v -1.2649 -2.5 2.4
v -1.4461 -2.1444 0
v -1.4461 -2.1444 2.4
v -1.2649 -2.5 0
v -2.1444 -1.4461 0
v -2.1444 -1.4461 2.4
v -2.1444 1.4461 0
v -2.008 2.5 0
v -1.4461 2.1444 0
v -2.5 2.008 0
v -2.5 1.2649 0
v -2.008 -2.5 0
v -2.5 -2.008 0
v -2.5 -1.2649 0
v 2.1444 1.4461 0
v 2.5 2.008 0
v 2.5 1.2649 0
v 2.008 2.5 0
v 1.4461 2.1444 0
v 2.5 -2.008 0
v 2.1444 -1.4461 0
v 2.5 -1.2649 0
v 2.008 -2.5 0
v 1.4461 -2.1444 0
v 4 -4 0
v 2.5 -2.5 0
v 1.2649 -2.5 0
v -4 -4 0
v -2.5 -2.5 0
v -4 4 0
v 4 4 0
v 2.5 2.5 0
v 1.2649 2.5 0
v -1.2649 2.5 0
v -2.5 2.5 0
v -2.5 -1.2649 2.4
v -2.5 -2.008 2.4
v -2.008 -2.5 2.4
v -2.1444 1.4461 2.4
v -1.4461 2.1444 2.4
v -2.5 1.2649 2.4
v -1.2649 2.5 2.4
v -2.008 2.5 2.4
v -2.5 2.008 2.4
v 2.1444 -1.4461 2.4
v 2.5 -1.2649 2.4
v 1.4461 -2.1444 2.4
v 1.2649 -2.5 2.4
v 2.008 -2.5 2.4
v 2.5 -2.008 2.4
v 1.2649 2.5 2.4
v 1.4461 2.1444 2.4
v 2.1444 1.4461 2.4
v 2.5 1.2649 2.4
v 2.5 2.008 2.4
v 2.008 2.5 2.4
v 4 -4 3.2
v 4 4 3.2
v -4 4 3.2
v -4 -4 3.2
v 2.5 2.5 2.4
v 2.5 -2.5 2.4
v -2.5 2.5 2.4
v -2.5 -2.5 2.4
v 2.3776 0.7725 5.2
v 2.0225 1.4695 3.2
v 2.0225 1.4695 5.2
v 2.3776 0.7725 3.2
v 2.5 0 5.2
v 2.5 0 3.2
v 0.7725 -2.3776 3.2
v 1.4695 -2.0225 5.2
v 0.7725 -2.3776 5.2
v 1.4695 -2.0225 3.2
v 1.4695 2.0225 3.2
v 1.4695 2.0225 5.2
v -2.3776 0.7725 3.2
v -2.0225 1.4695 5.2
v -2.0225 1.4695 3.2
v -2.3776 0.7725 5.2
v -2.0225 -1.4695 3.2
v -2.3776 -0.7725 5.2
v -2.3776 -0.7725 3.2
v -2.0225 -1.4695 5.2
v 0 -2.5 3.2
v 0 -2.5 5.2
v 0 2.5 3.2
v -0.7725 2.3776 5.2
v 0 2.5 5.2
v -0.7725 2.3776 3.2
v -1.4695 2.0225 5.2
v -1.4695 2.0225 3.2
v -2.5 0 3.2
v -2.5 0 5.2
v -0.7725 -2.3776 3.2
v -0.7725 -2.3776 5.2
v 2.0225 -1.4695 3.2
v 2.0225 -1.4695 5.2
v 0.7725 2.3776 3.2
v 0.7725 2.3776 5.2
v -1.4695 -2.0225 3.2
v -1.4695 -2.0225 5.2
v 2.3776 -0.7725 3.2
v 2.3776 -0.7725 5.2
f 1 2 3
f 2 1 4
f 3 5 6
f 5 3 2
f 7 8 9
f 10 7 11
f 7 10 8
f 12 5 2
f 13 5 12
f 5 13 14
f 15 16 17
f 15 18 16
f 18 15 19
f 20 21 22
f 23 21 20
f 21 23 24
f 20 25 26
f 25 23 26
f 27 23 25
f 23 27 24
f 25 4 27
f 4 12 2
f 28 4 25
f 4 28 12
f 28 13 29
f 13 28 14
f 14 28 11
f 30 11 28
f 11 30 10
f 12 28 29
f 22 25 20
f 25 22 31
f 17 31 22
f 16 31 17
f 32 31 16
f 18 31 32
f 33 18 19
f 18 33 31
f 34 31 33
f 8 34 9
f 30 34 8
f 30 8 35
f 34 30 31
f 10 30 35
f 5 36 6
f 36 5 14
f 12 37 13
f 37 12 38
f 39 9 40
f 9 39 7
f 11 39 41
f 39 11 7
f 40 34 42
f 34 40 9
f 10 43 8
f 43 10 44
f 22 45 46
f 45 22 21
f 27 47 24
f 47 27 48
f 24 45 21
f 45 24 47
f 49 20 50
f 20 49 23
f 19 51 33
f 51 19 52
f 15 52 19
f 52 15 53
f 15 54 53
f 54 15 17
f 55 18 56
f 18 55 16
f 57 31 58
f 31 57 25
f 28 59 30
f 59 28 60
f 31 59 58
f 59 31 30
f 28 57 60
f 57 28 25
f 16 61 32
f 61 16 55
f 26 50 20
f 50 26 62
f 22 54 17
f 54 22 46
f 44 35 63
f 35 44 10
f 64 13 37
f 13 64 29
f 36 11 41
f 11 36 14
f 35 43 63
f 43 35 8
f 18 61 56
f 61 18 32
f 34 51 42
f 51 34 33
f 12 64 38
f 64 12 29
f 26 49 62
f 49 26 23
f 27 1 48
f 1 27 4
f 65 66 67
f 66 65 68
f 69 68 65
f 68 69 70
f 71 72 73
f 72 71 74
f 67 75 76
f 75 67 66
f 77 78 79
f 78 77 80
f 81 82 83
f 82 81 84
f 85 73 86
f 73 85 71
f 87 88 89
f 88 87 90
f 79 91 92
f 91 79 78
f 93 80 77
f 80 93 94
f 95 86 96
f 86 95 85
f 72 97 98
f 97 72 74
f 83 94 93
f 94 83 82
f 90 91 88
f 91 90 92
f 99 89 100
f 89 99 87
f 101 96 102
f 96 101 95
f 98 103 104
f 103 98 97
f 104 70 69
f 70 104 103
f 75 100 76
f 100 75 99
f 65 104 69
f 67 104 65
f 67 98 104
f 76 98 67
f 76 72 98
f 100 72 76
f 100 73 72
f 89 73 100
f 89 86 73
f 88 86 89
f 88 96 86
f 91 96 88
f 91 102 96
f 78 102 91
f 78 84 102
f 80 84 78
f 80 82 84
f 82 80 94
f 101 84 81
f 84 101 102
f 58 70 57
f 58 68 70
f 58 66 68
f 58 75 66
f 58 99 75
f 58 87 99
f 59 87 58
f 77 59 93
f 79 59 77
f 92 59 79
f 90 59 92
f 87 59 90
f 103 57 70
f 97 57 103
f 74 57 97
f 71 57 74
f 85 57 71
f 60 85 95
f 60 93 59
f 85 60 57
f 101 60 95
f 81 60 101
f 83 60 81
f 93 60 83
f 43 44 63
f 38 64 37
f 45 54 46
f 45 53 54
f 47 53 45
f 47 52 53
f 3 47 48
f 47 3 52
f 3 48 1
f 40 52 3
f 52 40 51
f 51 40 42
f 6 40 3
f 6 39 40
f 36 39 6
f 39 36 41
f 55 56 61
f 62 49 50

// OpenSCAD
// file: bricks.scad
// Copyright 2013 Jonathan Hulka
// This program is free software; you can redistribute it and/or modify
// it under the terms of the GNU General Public License as published by
// the Free Software Foundation; either version 2 of the License, or
// (at your option) any later version.
// 
// This program is distributed in the hope that it will be useful,
// but WITHOUT ANY WARRANTY; without even the implied warranty of
// MERCHANTABILITY or FITNESS FOR A PARTICULAR PURPOSE.  See the
// GNU General Public License for more details.
// 
// You should have received a copy of the GNU General Public License
// along with this program; if not, write to the Free Software
// Foundation, Inc., 51 Franklin Street, Fifth Floor, Boston,
// MA 02110-1301, USA.


peg_space=8;
peg_radius=2.5;
peg_height=2;
peg_allowance=0.4; //Extra space for pegs in bottom of a brick of height 1
brick_height=3.2; //This is the flat brick
peg_diagonal_space=peg_space*sqrt(2);
//rod_radius=2;
$fn=20;
//left edge: x=0;
//top edge: y=0;
//peg bottom: z=0;
//The platform sits below the z axis
module brick_top(pegs_x,pegs_y)
{
//	difference()
//	{
		union()
		{
			//Pegs extend 0.2mm down into the platform to ensure connection
			for(i=[0:pegs_x-1], j=[0:pegs_y-1])
				translate([(0.5 + i)*peg_space, (0.5 + j)*peg_space,peg_height/2-0.1])
					cylinder(h=peg_height+0.2,r=peg_radius,center=true);
			//The platform sits just under the z-axis
			translate([pegs_x*peg_space/2,pegs_y*peg_space/2,-(brick_height-peg_height-peg_allowance)/2])
				cube(size=[pegs_x*peg_space,pegs_y*peg_space,brick_height-peg_height-peg_allowance],center=true);
		}
//		for(i=[0:pegs_x-1], j=[0:pegs_y-1])
//			translate([(0.5 + i)*peg_space, (0.5 + j)*peg_space,0])
//				cylinder(h=10,r=rod_radius,center=true);
//	}
}

module brick_bottom_cylinders(pegs_x,pegs_y,height,filled=false)
{
	intersection()
	{
		for(i=[0:pegs_x], j=[0:pegs_y])
		{
			translate([i*peg_space,j*peg_space,height/2])
			
			if(filled)
			{
				cylinder(h=height,r=(peg_diagonal_space-peg_radius*2)/2,center=true);
			}
			else
			{
				difference()
				{
					cylinder(h=height,r=(peg_diagonal_space-peg_radius*2)/2,center=true);
					cylinder(h=height+1,r=peg_radius,center=true);
				}
			}
		}
		translate([pegs_x/2*peg_space,pegs_y/2*peg_space,height/2])
		cube(size=[pegs_x*peg_space,pegs_y*peg_space,height+1],center=true);
	}	
}

module brick_bottom_edges(pegs_x,pegs_y,height)
{
	translate([peg_space*pegs_x/2,peg_space*pegs_y/2,height/2]) difference()
	{
		cube(size=[peg_space*pegs_x,peg_space*pegs_y,height],center=true);
		cube(size=[peg_space*(pegs_x-1)+peg_radius*2,peg_space*(pegs_y-1)+peg_radius*2,height+1],center=true);
	}
}

module simple_brick(pegs_x,pegs_y,bricks_z)
{
	union()
	{
		translate([-peg_space*pegs_x/2,-peg_space*pegs_y/2,0])
		{
			brick_bottom_cylinders(pegs_x,pegs_y,brick_height*bricks_z);
			brick_bottom_edges(pegs_x,pegs_y,brick_height*bricks_z);
		}
		translate([-peg_space*pegs_x/2,-peg_space*pegs_y/2,brick_height*bricks_z]) brick_top(pegs_x,pegs_y);
	}
}
// main file
// Copyright 2013 Jonathan Hulka
// This program is free software; you can redistribute it and/or modify
// it under the terms of the GNU General Public License as published by
// the Free Software Foundation; either version 2 of the License, or
// (at your option) any later version.
// 
// This program is distributed in the hope that it will be useful,
// but WITHOUT ANY WARRANTY; without even the implied warranty of
// MERCHANTABILITY or FITNESS FOR A PARTICULAR PURPOSE.  See the
// GNU General Public License for more details.
// 
// You should have received a copy of the GNU General Public License
// along with this program; if not, write to the Free Software
// Foundation, Inc., 51 Franklin Street, Fifth Floor, Boston,
// MA 02110-1301, USA.

include <bricks.scad>;

//Uncomment this for calibration
simple_brick(1,1,1);
//Uncomment for an exploded view of the arch
//arch_demo();
//Uncomment for a full set (8 bricks and a keystone)
//build_set();
//Uncomment for a single brick
//arch_brick();
//Uncomment for a single keystone
//keystone();

module arch_demo()
{
	union()
	{
		for(i=[0:3],j=[0,1]) rotate([0,i*20,j*180])translate([-peg_space*5,0,0])arch_brick();
		translate([0,0,peg_space])rotate([0,80,0])translate([-peg_space*4,0,0])keystone();
	}
	
}

module build_set()
{
	union() for(i=[-1:1],j=[-1:1])
	{
		if(i==0 && j==0)
		{
			keystone();
		}
		else translate([i*peg_space*3,j*peg_space*3,0])arch_brick();
	}
}

//To do: make this into a module to accept arch radius and brick size parameters
//Brick size for the arch is hardcoded at 2x2
//Arch inner radius is hardcoded to 3 peg spaces
module arch_brick()
{
	translate([peg_space*4,0,0])union()
	{
		difference(){shell_outer();shell_inner();}
		intersection()
		{
			shell_outer();
			arch_cylinders(filled=true);
		}
		rotate([0,20,0])translate([-peg_space*5,-peg_space,0])brick_top(2,2);
	}
}

module keystone()
{
	translate([peg_space*4,0,0])union()
	{
		difference(){shell_outer();shell_inner();}
		intersection()
		{
			shell_outer();
			arch_cylinders();
		}
	}
}

module shell_outer()
{
		hull()for(i=[0,1])rotate([0,i*20,0])translate([-peg_space*4,0,(peg_height+peg_allowance)*(0.5-i)])
			cube(size=[peg_space*2,peg_space*2,peg_height+peg_allowance],center=true);
}

module shell_inner()
{
		hull()for(i=[0,1])rotate([0,i*20,0])translate([-peg_space*4,0,(peg_height+peg_allowance)*(0.5-i)])
			cube(size=[peg_space+peg_radius*2,peg_space+peg_radius*2,peg_height+peg_allowance+1],center=true);
}

//filled: if true, the top half of the brick is filled (don't use for the keystone)
//- this ensures that there are no hollow spaces
//(since exporting to STL won't work if there are)
module arch_cylinders(filled=false)
{
	module arch_span(degrees)
	{
		rotate([0,degrees,0])translate([-peg_space*4,0,0])
			cube(size=[peg_space*2,peg_space*2,peg_height*peg_allowance],center=true);
	}
	//upright cylinders with a spanning piece at 10 degrees
	union()
	{
		arch_span(10);
		intersection()
		{
			translate([-peg_space*5,-peg_space,0]) brick_bottom_cylinders(2,2,100);
			hull()
			{
				arch_span(0);
				arch_span(10);
			}
		}
		intersection()
		{
			if(!filled) rotate([0,20,0])translate([-peg_space*5,-peg_space,-100]) brick_bottom_cylinders(2,2,100,filled);
			hull()
			{
				arch_span(10);
				arch_span(20);
			}
		}
	}
}
